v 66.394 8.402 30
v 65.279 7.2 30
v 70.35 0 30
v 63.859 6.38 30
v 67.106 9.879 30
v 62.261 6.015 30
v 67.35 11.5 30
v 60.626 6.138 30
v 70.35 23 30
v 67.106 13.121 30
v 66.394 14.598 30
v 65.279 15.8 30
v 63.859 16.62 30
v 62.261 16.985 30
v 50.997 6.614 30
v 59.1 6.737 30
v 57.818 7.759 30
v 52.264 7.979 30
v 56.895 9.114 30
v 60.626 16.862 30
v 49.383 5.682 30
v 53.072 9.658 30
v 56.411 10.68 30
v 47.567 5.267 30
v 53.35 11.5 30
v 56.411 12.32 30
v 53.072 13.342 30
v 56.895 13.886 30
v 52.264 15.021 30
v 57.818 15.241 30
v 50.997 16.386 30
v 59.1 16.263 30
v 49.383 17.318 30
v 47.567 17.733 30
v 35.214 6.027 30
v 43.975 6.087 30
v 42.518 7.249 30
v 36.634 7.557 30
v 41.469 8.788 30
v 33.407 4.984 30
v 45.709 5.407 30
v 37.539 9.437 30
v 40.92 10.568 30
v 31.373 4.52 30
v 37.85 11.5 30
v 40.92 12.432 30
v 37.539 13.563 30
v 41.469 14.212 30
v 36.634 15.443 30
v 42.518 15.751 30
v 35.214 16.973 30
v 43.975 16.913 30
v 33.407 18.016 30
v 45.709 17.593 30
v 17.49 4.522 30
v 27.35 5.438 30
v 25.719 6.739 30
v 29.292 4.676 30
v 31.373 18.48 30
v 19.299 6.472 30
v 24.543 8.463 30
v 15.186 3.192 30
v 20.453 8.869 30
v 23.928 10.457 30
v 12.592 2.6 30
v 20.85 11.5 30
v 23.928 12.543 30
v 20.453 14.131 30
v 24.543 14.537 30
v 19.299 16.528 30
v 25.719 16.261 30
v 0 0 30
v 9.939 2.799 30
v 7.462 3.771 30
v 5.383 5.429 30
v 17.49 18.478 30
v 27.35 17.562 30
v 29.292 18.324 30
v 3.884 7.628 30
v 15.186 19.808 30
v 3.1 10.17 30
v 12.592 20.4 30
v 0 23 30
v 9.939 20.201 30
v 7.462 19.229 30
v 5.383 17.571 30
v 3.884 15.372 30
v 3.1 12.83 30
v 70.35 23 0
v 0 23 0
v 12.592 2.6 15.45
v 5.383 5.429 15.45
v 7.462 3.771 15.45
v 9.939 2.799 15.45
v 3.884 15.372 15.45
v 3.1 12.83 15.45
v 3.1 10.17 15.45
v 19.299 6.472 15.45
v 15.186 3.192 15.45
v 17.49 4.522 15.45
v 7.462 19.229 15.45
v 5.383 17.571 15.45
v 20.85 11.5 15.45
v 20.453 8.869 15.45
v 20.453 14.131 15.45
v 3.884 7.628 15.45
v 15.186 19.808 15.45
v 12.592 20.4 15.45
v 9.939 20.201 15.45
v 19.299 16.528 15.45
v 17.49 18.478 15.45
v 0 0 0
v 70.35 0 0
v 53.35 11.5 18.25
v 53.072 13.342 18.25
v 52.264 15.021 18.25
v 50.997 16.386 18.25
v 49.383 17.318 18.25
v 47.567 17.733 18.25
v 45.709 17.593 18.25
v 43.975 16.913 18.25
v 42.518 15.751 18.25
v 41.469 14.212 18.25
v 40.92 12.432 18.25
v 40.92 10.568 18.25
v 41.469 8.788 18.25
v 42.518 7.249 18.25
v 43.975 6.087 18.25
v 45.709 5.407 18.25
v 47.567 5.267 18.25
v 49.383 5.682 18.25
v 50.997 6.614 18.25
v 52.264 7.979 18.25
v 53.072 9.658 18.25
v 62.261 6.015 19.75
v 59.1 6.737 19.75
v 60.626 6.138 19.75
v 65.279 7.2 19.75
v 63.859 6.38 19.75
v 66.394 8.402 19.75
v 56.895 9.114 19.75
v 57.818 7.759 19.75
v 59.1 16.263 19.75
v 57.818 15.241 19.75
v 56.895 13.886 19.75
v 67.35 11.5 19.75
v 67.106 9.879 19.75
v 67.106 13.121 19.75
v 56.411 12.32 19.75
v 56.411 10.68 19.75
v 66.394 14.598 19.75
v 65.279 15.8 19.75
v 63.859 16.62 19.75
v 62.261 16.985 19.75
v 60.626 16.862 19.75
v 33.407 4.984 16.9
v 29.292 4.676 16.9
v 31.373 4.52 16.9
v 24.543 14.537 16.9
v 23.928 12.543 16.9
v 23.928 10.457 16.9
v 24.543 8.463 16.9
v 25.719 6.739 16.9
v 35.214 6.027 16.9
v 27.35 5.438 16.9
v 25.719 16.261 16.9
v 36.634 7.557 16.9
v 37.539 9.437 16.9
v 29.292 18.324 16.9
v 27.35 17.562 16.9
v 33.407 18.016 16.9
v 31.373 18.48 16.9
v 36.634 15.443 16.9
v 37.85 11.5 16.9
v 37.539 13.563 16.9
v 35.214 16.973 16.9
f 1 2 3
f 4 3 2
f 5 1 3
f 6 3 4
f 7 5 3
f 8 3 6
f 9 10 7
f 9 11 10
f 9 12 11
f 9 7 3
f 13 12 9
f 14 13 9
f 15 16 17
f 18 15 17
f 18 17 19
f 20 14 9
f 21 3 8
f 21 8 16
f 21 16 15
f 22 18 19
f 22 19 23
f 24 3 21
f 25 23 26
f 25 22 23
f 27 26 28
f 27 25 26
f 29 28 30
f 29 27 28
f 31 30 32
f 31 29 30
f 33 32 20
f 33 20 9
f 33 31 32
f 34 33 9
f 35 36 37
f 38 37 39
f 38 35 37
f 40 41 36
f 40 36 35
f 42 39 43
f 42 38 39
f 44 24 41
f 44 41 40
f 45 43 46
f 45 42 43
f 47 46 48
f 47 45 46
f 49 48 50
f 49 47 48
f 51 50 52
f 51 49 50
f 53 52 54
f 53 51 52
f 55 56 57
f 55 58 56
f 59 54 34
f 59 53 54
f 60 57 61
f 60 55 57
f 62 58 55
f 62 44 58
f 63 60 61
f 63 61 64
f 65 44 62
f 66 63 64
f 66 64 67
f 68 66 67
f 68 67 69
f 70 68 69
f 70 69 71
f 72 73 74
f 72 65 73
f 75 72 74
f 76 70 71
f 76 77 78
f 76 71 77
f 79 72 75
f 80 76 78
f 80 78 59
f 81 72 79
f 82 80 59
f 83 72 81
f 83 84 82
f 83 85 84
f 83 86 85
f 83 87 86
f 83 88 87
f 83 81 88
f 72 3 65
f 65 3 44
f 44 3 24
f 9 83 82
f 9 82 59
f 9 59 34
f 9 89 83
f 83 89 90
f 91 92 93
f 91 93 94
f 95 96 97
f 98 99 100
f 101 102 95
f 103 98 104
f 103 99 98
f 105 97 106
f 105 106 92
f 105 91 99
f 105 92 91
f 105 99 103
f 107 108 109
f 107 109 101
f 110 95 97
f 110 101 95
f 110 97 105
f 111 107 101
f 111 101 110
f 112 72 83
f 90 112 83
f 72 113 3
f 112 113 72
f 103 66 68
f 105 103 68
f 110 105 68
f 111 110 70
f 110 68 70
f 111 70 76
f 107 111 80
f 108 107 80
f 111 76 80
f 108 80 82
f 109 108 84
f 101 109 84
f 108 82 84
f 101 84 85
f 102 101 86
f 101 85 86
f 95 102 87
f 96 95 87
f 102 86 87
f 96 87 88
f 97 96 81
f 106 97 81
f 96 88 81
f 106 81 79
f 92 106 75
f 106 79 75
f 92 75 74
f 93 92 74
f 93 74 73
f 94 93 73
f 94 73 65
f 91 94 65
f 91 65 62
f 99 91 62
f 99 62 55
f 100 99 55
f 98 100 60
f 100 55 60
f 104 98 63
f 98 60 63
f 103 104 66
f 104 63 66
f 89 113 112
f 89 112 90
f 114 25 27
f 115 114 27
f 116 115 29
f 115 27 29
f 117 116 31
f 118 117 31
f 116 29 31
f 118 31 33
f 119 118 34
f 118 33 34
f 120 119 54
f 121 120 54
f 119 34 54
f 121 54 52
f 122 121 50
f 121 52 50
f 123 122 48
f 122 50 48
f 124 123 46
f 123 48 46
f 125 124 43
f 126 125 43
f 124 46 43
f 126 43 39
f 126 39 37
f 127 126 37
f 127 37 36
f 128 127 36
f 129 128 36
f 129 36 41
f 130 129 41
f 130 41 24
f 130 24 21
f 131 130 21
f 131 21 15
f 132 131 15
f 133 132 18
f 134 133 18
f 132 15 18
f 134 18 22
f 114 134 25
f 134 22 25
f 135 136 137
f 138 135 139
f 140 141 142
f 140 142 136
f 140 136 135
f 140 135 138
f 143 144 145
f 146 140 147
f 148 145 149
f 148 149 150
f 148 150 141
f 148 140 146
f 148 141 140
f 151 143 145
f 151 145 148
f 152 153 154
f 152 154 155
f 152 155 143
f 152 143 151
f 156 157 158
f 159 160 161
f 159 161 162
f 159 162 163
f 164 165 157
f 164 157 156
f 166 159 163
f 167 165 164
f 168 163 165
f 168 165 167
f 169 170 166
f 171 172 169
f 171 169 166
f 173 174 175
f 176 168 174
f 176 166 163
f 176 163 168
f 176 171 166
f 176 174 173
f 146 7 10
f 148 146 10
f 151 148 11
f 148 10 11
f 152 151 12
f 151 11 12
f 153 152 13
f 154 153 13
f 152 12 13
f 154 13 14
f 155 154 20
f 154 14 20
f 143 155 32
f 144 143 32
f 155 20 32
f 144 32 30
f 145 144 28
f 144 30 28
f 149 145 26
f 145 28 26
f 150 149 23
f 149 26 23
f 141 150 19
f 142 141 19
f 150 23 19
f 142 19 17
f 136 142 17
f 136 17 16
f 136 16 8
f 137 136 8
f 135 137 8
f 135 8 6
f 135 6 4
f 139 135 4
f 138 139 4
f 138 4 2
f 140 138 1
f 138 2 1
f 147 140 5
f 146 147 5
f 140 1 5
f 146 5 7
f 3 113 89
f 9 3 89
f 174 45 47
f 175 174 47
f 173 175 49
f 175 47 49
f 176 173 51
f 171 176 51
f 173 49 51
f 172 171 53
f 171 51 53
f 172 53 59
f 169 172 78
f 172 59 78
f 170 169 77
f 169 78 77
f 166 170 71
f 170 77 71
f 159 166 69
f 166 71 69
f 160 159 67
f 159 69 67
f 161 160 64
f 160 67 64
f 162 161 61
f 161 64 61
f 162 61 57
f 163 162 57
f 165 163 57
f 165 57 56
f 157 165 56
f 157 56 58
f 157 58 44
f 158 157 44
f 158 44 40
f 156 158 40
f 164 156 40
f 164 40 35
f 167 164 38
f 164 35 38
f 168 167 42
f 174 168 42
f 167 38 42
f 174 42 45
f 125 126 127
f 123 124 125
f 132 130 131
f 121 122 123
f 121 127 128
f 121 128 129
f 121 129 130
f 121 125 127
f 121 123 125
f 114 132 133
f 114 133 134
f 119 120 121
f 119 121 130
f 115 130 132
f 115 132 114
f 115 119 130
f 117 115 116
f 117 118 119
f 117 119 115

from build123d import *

# Parameters (mm, degrees)
SKETCH006_W      = 9.472441
SKETCH006_H      = 23
EXTRUDE005_DEPTH = 40
SKETCH005_R      = 5.5
EXTRUDE004_DEPTH = 10.25
SKETCH004_R      = 6.25
EXTRUDE003_DEPTH = 11.75
SKETCH003_R      = 7
EXTRUDE002_DEPTH = 13.1
SKETCH002_R      = 8.925
EXTRUDE001_DEPTH = 14.55
FACE_W           = 23
FACE_H           = 79.822441
EXTRUDE_DEPTH    = 30


with BuildPart() as extrude005:
    # Sketch006 (on Face5 of Cut003) → Extrude005 (new body)
    with BuildSketch(Plane.XY.offset(30)):
        with Locations((75.08622, 11.5)):
            Rectangle(SKETCH006_W, SKETCH006_H)
    extrude(amount=-EXTRUDE005_DEPTH)


with BuildPart() as extrude004:
    # Sketch005 (on Face5 of Cut002) → Extrude004 (new body)
    with BuildSketch(Plane.XY.offset(30)):
        with Locations((61.85, 11.5)):
            Circle(SKETCH005_R)
    extrude(amount=-EXTRUDE004_DEPTH)


with BuildPart() as extrude003:
    # Sketch004 (on Face5 of Cut001) → Extrude003 (new body)
    with BuildSketch(Plane.XY.offset(30)):
        with Locations((47.1, 11.5)):
            Circle(SKETCH004_R)
    extrude(amount=-EXTRUDE003_DEPTH)


with BuildPart() as extrude002:
    # Sketch003 (on Face5 of Cut) → Extrude002 (new body)
    with BuildSketch(Plane.XY.offset(30)):
        with Locations((30.85, 11.5)):
            Circle(SKETCH003_R)
    extrude(amount=-EXTRUDE002_DEPTH)


with BuildPart() as extrude001:
    # Sketch002 (on Face6 of Extrude) → Extrude001 (new body)
    with BuildSketch(Plane.XY.offset(30)):
        with Locations((11.925, 11.5)):
            Circle(SKETCH002_R)
    extrude(amount=-EXTRUDE001_DEPTH)


with BuildPart() as cut004:
    # Face → Extrude (new body)
    with BuildSketch(Plane(origin=(39.91122, 11.5, 0), x_dir=(0, 1, 0), z_dir=(0, 0, 1))):
        with Locations((0, 0)):
            Rectangle(FACE_W, FACE_H)
    extrude(amount=EXTRUDE_DEPTH)

    # Cut: cut Extrude001
    add(extrude001.part, mode=Mode.SUBTRACT)

    # Cut001: cut Extrude002
    add(extrude002.part, mode=Mode.SUBTRACT)

    # Cut002: cut Extrude003
    add(extrude003.part, mode=Mode.SUBTRACT)

    # Cut003: cut Extrude004
    add(extrude004.part, mode=Mode.SUBTRACT)

    # Cut004: cut Extrude005
    add(extrude005.part, mode=Mode.SUBTRACT)


solid = cut004.part
